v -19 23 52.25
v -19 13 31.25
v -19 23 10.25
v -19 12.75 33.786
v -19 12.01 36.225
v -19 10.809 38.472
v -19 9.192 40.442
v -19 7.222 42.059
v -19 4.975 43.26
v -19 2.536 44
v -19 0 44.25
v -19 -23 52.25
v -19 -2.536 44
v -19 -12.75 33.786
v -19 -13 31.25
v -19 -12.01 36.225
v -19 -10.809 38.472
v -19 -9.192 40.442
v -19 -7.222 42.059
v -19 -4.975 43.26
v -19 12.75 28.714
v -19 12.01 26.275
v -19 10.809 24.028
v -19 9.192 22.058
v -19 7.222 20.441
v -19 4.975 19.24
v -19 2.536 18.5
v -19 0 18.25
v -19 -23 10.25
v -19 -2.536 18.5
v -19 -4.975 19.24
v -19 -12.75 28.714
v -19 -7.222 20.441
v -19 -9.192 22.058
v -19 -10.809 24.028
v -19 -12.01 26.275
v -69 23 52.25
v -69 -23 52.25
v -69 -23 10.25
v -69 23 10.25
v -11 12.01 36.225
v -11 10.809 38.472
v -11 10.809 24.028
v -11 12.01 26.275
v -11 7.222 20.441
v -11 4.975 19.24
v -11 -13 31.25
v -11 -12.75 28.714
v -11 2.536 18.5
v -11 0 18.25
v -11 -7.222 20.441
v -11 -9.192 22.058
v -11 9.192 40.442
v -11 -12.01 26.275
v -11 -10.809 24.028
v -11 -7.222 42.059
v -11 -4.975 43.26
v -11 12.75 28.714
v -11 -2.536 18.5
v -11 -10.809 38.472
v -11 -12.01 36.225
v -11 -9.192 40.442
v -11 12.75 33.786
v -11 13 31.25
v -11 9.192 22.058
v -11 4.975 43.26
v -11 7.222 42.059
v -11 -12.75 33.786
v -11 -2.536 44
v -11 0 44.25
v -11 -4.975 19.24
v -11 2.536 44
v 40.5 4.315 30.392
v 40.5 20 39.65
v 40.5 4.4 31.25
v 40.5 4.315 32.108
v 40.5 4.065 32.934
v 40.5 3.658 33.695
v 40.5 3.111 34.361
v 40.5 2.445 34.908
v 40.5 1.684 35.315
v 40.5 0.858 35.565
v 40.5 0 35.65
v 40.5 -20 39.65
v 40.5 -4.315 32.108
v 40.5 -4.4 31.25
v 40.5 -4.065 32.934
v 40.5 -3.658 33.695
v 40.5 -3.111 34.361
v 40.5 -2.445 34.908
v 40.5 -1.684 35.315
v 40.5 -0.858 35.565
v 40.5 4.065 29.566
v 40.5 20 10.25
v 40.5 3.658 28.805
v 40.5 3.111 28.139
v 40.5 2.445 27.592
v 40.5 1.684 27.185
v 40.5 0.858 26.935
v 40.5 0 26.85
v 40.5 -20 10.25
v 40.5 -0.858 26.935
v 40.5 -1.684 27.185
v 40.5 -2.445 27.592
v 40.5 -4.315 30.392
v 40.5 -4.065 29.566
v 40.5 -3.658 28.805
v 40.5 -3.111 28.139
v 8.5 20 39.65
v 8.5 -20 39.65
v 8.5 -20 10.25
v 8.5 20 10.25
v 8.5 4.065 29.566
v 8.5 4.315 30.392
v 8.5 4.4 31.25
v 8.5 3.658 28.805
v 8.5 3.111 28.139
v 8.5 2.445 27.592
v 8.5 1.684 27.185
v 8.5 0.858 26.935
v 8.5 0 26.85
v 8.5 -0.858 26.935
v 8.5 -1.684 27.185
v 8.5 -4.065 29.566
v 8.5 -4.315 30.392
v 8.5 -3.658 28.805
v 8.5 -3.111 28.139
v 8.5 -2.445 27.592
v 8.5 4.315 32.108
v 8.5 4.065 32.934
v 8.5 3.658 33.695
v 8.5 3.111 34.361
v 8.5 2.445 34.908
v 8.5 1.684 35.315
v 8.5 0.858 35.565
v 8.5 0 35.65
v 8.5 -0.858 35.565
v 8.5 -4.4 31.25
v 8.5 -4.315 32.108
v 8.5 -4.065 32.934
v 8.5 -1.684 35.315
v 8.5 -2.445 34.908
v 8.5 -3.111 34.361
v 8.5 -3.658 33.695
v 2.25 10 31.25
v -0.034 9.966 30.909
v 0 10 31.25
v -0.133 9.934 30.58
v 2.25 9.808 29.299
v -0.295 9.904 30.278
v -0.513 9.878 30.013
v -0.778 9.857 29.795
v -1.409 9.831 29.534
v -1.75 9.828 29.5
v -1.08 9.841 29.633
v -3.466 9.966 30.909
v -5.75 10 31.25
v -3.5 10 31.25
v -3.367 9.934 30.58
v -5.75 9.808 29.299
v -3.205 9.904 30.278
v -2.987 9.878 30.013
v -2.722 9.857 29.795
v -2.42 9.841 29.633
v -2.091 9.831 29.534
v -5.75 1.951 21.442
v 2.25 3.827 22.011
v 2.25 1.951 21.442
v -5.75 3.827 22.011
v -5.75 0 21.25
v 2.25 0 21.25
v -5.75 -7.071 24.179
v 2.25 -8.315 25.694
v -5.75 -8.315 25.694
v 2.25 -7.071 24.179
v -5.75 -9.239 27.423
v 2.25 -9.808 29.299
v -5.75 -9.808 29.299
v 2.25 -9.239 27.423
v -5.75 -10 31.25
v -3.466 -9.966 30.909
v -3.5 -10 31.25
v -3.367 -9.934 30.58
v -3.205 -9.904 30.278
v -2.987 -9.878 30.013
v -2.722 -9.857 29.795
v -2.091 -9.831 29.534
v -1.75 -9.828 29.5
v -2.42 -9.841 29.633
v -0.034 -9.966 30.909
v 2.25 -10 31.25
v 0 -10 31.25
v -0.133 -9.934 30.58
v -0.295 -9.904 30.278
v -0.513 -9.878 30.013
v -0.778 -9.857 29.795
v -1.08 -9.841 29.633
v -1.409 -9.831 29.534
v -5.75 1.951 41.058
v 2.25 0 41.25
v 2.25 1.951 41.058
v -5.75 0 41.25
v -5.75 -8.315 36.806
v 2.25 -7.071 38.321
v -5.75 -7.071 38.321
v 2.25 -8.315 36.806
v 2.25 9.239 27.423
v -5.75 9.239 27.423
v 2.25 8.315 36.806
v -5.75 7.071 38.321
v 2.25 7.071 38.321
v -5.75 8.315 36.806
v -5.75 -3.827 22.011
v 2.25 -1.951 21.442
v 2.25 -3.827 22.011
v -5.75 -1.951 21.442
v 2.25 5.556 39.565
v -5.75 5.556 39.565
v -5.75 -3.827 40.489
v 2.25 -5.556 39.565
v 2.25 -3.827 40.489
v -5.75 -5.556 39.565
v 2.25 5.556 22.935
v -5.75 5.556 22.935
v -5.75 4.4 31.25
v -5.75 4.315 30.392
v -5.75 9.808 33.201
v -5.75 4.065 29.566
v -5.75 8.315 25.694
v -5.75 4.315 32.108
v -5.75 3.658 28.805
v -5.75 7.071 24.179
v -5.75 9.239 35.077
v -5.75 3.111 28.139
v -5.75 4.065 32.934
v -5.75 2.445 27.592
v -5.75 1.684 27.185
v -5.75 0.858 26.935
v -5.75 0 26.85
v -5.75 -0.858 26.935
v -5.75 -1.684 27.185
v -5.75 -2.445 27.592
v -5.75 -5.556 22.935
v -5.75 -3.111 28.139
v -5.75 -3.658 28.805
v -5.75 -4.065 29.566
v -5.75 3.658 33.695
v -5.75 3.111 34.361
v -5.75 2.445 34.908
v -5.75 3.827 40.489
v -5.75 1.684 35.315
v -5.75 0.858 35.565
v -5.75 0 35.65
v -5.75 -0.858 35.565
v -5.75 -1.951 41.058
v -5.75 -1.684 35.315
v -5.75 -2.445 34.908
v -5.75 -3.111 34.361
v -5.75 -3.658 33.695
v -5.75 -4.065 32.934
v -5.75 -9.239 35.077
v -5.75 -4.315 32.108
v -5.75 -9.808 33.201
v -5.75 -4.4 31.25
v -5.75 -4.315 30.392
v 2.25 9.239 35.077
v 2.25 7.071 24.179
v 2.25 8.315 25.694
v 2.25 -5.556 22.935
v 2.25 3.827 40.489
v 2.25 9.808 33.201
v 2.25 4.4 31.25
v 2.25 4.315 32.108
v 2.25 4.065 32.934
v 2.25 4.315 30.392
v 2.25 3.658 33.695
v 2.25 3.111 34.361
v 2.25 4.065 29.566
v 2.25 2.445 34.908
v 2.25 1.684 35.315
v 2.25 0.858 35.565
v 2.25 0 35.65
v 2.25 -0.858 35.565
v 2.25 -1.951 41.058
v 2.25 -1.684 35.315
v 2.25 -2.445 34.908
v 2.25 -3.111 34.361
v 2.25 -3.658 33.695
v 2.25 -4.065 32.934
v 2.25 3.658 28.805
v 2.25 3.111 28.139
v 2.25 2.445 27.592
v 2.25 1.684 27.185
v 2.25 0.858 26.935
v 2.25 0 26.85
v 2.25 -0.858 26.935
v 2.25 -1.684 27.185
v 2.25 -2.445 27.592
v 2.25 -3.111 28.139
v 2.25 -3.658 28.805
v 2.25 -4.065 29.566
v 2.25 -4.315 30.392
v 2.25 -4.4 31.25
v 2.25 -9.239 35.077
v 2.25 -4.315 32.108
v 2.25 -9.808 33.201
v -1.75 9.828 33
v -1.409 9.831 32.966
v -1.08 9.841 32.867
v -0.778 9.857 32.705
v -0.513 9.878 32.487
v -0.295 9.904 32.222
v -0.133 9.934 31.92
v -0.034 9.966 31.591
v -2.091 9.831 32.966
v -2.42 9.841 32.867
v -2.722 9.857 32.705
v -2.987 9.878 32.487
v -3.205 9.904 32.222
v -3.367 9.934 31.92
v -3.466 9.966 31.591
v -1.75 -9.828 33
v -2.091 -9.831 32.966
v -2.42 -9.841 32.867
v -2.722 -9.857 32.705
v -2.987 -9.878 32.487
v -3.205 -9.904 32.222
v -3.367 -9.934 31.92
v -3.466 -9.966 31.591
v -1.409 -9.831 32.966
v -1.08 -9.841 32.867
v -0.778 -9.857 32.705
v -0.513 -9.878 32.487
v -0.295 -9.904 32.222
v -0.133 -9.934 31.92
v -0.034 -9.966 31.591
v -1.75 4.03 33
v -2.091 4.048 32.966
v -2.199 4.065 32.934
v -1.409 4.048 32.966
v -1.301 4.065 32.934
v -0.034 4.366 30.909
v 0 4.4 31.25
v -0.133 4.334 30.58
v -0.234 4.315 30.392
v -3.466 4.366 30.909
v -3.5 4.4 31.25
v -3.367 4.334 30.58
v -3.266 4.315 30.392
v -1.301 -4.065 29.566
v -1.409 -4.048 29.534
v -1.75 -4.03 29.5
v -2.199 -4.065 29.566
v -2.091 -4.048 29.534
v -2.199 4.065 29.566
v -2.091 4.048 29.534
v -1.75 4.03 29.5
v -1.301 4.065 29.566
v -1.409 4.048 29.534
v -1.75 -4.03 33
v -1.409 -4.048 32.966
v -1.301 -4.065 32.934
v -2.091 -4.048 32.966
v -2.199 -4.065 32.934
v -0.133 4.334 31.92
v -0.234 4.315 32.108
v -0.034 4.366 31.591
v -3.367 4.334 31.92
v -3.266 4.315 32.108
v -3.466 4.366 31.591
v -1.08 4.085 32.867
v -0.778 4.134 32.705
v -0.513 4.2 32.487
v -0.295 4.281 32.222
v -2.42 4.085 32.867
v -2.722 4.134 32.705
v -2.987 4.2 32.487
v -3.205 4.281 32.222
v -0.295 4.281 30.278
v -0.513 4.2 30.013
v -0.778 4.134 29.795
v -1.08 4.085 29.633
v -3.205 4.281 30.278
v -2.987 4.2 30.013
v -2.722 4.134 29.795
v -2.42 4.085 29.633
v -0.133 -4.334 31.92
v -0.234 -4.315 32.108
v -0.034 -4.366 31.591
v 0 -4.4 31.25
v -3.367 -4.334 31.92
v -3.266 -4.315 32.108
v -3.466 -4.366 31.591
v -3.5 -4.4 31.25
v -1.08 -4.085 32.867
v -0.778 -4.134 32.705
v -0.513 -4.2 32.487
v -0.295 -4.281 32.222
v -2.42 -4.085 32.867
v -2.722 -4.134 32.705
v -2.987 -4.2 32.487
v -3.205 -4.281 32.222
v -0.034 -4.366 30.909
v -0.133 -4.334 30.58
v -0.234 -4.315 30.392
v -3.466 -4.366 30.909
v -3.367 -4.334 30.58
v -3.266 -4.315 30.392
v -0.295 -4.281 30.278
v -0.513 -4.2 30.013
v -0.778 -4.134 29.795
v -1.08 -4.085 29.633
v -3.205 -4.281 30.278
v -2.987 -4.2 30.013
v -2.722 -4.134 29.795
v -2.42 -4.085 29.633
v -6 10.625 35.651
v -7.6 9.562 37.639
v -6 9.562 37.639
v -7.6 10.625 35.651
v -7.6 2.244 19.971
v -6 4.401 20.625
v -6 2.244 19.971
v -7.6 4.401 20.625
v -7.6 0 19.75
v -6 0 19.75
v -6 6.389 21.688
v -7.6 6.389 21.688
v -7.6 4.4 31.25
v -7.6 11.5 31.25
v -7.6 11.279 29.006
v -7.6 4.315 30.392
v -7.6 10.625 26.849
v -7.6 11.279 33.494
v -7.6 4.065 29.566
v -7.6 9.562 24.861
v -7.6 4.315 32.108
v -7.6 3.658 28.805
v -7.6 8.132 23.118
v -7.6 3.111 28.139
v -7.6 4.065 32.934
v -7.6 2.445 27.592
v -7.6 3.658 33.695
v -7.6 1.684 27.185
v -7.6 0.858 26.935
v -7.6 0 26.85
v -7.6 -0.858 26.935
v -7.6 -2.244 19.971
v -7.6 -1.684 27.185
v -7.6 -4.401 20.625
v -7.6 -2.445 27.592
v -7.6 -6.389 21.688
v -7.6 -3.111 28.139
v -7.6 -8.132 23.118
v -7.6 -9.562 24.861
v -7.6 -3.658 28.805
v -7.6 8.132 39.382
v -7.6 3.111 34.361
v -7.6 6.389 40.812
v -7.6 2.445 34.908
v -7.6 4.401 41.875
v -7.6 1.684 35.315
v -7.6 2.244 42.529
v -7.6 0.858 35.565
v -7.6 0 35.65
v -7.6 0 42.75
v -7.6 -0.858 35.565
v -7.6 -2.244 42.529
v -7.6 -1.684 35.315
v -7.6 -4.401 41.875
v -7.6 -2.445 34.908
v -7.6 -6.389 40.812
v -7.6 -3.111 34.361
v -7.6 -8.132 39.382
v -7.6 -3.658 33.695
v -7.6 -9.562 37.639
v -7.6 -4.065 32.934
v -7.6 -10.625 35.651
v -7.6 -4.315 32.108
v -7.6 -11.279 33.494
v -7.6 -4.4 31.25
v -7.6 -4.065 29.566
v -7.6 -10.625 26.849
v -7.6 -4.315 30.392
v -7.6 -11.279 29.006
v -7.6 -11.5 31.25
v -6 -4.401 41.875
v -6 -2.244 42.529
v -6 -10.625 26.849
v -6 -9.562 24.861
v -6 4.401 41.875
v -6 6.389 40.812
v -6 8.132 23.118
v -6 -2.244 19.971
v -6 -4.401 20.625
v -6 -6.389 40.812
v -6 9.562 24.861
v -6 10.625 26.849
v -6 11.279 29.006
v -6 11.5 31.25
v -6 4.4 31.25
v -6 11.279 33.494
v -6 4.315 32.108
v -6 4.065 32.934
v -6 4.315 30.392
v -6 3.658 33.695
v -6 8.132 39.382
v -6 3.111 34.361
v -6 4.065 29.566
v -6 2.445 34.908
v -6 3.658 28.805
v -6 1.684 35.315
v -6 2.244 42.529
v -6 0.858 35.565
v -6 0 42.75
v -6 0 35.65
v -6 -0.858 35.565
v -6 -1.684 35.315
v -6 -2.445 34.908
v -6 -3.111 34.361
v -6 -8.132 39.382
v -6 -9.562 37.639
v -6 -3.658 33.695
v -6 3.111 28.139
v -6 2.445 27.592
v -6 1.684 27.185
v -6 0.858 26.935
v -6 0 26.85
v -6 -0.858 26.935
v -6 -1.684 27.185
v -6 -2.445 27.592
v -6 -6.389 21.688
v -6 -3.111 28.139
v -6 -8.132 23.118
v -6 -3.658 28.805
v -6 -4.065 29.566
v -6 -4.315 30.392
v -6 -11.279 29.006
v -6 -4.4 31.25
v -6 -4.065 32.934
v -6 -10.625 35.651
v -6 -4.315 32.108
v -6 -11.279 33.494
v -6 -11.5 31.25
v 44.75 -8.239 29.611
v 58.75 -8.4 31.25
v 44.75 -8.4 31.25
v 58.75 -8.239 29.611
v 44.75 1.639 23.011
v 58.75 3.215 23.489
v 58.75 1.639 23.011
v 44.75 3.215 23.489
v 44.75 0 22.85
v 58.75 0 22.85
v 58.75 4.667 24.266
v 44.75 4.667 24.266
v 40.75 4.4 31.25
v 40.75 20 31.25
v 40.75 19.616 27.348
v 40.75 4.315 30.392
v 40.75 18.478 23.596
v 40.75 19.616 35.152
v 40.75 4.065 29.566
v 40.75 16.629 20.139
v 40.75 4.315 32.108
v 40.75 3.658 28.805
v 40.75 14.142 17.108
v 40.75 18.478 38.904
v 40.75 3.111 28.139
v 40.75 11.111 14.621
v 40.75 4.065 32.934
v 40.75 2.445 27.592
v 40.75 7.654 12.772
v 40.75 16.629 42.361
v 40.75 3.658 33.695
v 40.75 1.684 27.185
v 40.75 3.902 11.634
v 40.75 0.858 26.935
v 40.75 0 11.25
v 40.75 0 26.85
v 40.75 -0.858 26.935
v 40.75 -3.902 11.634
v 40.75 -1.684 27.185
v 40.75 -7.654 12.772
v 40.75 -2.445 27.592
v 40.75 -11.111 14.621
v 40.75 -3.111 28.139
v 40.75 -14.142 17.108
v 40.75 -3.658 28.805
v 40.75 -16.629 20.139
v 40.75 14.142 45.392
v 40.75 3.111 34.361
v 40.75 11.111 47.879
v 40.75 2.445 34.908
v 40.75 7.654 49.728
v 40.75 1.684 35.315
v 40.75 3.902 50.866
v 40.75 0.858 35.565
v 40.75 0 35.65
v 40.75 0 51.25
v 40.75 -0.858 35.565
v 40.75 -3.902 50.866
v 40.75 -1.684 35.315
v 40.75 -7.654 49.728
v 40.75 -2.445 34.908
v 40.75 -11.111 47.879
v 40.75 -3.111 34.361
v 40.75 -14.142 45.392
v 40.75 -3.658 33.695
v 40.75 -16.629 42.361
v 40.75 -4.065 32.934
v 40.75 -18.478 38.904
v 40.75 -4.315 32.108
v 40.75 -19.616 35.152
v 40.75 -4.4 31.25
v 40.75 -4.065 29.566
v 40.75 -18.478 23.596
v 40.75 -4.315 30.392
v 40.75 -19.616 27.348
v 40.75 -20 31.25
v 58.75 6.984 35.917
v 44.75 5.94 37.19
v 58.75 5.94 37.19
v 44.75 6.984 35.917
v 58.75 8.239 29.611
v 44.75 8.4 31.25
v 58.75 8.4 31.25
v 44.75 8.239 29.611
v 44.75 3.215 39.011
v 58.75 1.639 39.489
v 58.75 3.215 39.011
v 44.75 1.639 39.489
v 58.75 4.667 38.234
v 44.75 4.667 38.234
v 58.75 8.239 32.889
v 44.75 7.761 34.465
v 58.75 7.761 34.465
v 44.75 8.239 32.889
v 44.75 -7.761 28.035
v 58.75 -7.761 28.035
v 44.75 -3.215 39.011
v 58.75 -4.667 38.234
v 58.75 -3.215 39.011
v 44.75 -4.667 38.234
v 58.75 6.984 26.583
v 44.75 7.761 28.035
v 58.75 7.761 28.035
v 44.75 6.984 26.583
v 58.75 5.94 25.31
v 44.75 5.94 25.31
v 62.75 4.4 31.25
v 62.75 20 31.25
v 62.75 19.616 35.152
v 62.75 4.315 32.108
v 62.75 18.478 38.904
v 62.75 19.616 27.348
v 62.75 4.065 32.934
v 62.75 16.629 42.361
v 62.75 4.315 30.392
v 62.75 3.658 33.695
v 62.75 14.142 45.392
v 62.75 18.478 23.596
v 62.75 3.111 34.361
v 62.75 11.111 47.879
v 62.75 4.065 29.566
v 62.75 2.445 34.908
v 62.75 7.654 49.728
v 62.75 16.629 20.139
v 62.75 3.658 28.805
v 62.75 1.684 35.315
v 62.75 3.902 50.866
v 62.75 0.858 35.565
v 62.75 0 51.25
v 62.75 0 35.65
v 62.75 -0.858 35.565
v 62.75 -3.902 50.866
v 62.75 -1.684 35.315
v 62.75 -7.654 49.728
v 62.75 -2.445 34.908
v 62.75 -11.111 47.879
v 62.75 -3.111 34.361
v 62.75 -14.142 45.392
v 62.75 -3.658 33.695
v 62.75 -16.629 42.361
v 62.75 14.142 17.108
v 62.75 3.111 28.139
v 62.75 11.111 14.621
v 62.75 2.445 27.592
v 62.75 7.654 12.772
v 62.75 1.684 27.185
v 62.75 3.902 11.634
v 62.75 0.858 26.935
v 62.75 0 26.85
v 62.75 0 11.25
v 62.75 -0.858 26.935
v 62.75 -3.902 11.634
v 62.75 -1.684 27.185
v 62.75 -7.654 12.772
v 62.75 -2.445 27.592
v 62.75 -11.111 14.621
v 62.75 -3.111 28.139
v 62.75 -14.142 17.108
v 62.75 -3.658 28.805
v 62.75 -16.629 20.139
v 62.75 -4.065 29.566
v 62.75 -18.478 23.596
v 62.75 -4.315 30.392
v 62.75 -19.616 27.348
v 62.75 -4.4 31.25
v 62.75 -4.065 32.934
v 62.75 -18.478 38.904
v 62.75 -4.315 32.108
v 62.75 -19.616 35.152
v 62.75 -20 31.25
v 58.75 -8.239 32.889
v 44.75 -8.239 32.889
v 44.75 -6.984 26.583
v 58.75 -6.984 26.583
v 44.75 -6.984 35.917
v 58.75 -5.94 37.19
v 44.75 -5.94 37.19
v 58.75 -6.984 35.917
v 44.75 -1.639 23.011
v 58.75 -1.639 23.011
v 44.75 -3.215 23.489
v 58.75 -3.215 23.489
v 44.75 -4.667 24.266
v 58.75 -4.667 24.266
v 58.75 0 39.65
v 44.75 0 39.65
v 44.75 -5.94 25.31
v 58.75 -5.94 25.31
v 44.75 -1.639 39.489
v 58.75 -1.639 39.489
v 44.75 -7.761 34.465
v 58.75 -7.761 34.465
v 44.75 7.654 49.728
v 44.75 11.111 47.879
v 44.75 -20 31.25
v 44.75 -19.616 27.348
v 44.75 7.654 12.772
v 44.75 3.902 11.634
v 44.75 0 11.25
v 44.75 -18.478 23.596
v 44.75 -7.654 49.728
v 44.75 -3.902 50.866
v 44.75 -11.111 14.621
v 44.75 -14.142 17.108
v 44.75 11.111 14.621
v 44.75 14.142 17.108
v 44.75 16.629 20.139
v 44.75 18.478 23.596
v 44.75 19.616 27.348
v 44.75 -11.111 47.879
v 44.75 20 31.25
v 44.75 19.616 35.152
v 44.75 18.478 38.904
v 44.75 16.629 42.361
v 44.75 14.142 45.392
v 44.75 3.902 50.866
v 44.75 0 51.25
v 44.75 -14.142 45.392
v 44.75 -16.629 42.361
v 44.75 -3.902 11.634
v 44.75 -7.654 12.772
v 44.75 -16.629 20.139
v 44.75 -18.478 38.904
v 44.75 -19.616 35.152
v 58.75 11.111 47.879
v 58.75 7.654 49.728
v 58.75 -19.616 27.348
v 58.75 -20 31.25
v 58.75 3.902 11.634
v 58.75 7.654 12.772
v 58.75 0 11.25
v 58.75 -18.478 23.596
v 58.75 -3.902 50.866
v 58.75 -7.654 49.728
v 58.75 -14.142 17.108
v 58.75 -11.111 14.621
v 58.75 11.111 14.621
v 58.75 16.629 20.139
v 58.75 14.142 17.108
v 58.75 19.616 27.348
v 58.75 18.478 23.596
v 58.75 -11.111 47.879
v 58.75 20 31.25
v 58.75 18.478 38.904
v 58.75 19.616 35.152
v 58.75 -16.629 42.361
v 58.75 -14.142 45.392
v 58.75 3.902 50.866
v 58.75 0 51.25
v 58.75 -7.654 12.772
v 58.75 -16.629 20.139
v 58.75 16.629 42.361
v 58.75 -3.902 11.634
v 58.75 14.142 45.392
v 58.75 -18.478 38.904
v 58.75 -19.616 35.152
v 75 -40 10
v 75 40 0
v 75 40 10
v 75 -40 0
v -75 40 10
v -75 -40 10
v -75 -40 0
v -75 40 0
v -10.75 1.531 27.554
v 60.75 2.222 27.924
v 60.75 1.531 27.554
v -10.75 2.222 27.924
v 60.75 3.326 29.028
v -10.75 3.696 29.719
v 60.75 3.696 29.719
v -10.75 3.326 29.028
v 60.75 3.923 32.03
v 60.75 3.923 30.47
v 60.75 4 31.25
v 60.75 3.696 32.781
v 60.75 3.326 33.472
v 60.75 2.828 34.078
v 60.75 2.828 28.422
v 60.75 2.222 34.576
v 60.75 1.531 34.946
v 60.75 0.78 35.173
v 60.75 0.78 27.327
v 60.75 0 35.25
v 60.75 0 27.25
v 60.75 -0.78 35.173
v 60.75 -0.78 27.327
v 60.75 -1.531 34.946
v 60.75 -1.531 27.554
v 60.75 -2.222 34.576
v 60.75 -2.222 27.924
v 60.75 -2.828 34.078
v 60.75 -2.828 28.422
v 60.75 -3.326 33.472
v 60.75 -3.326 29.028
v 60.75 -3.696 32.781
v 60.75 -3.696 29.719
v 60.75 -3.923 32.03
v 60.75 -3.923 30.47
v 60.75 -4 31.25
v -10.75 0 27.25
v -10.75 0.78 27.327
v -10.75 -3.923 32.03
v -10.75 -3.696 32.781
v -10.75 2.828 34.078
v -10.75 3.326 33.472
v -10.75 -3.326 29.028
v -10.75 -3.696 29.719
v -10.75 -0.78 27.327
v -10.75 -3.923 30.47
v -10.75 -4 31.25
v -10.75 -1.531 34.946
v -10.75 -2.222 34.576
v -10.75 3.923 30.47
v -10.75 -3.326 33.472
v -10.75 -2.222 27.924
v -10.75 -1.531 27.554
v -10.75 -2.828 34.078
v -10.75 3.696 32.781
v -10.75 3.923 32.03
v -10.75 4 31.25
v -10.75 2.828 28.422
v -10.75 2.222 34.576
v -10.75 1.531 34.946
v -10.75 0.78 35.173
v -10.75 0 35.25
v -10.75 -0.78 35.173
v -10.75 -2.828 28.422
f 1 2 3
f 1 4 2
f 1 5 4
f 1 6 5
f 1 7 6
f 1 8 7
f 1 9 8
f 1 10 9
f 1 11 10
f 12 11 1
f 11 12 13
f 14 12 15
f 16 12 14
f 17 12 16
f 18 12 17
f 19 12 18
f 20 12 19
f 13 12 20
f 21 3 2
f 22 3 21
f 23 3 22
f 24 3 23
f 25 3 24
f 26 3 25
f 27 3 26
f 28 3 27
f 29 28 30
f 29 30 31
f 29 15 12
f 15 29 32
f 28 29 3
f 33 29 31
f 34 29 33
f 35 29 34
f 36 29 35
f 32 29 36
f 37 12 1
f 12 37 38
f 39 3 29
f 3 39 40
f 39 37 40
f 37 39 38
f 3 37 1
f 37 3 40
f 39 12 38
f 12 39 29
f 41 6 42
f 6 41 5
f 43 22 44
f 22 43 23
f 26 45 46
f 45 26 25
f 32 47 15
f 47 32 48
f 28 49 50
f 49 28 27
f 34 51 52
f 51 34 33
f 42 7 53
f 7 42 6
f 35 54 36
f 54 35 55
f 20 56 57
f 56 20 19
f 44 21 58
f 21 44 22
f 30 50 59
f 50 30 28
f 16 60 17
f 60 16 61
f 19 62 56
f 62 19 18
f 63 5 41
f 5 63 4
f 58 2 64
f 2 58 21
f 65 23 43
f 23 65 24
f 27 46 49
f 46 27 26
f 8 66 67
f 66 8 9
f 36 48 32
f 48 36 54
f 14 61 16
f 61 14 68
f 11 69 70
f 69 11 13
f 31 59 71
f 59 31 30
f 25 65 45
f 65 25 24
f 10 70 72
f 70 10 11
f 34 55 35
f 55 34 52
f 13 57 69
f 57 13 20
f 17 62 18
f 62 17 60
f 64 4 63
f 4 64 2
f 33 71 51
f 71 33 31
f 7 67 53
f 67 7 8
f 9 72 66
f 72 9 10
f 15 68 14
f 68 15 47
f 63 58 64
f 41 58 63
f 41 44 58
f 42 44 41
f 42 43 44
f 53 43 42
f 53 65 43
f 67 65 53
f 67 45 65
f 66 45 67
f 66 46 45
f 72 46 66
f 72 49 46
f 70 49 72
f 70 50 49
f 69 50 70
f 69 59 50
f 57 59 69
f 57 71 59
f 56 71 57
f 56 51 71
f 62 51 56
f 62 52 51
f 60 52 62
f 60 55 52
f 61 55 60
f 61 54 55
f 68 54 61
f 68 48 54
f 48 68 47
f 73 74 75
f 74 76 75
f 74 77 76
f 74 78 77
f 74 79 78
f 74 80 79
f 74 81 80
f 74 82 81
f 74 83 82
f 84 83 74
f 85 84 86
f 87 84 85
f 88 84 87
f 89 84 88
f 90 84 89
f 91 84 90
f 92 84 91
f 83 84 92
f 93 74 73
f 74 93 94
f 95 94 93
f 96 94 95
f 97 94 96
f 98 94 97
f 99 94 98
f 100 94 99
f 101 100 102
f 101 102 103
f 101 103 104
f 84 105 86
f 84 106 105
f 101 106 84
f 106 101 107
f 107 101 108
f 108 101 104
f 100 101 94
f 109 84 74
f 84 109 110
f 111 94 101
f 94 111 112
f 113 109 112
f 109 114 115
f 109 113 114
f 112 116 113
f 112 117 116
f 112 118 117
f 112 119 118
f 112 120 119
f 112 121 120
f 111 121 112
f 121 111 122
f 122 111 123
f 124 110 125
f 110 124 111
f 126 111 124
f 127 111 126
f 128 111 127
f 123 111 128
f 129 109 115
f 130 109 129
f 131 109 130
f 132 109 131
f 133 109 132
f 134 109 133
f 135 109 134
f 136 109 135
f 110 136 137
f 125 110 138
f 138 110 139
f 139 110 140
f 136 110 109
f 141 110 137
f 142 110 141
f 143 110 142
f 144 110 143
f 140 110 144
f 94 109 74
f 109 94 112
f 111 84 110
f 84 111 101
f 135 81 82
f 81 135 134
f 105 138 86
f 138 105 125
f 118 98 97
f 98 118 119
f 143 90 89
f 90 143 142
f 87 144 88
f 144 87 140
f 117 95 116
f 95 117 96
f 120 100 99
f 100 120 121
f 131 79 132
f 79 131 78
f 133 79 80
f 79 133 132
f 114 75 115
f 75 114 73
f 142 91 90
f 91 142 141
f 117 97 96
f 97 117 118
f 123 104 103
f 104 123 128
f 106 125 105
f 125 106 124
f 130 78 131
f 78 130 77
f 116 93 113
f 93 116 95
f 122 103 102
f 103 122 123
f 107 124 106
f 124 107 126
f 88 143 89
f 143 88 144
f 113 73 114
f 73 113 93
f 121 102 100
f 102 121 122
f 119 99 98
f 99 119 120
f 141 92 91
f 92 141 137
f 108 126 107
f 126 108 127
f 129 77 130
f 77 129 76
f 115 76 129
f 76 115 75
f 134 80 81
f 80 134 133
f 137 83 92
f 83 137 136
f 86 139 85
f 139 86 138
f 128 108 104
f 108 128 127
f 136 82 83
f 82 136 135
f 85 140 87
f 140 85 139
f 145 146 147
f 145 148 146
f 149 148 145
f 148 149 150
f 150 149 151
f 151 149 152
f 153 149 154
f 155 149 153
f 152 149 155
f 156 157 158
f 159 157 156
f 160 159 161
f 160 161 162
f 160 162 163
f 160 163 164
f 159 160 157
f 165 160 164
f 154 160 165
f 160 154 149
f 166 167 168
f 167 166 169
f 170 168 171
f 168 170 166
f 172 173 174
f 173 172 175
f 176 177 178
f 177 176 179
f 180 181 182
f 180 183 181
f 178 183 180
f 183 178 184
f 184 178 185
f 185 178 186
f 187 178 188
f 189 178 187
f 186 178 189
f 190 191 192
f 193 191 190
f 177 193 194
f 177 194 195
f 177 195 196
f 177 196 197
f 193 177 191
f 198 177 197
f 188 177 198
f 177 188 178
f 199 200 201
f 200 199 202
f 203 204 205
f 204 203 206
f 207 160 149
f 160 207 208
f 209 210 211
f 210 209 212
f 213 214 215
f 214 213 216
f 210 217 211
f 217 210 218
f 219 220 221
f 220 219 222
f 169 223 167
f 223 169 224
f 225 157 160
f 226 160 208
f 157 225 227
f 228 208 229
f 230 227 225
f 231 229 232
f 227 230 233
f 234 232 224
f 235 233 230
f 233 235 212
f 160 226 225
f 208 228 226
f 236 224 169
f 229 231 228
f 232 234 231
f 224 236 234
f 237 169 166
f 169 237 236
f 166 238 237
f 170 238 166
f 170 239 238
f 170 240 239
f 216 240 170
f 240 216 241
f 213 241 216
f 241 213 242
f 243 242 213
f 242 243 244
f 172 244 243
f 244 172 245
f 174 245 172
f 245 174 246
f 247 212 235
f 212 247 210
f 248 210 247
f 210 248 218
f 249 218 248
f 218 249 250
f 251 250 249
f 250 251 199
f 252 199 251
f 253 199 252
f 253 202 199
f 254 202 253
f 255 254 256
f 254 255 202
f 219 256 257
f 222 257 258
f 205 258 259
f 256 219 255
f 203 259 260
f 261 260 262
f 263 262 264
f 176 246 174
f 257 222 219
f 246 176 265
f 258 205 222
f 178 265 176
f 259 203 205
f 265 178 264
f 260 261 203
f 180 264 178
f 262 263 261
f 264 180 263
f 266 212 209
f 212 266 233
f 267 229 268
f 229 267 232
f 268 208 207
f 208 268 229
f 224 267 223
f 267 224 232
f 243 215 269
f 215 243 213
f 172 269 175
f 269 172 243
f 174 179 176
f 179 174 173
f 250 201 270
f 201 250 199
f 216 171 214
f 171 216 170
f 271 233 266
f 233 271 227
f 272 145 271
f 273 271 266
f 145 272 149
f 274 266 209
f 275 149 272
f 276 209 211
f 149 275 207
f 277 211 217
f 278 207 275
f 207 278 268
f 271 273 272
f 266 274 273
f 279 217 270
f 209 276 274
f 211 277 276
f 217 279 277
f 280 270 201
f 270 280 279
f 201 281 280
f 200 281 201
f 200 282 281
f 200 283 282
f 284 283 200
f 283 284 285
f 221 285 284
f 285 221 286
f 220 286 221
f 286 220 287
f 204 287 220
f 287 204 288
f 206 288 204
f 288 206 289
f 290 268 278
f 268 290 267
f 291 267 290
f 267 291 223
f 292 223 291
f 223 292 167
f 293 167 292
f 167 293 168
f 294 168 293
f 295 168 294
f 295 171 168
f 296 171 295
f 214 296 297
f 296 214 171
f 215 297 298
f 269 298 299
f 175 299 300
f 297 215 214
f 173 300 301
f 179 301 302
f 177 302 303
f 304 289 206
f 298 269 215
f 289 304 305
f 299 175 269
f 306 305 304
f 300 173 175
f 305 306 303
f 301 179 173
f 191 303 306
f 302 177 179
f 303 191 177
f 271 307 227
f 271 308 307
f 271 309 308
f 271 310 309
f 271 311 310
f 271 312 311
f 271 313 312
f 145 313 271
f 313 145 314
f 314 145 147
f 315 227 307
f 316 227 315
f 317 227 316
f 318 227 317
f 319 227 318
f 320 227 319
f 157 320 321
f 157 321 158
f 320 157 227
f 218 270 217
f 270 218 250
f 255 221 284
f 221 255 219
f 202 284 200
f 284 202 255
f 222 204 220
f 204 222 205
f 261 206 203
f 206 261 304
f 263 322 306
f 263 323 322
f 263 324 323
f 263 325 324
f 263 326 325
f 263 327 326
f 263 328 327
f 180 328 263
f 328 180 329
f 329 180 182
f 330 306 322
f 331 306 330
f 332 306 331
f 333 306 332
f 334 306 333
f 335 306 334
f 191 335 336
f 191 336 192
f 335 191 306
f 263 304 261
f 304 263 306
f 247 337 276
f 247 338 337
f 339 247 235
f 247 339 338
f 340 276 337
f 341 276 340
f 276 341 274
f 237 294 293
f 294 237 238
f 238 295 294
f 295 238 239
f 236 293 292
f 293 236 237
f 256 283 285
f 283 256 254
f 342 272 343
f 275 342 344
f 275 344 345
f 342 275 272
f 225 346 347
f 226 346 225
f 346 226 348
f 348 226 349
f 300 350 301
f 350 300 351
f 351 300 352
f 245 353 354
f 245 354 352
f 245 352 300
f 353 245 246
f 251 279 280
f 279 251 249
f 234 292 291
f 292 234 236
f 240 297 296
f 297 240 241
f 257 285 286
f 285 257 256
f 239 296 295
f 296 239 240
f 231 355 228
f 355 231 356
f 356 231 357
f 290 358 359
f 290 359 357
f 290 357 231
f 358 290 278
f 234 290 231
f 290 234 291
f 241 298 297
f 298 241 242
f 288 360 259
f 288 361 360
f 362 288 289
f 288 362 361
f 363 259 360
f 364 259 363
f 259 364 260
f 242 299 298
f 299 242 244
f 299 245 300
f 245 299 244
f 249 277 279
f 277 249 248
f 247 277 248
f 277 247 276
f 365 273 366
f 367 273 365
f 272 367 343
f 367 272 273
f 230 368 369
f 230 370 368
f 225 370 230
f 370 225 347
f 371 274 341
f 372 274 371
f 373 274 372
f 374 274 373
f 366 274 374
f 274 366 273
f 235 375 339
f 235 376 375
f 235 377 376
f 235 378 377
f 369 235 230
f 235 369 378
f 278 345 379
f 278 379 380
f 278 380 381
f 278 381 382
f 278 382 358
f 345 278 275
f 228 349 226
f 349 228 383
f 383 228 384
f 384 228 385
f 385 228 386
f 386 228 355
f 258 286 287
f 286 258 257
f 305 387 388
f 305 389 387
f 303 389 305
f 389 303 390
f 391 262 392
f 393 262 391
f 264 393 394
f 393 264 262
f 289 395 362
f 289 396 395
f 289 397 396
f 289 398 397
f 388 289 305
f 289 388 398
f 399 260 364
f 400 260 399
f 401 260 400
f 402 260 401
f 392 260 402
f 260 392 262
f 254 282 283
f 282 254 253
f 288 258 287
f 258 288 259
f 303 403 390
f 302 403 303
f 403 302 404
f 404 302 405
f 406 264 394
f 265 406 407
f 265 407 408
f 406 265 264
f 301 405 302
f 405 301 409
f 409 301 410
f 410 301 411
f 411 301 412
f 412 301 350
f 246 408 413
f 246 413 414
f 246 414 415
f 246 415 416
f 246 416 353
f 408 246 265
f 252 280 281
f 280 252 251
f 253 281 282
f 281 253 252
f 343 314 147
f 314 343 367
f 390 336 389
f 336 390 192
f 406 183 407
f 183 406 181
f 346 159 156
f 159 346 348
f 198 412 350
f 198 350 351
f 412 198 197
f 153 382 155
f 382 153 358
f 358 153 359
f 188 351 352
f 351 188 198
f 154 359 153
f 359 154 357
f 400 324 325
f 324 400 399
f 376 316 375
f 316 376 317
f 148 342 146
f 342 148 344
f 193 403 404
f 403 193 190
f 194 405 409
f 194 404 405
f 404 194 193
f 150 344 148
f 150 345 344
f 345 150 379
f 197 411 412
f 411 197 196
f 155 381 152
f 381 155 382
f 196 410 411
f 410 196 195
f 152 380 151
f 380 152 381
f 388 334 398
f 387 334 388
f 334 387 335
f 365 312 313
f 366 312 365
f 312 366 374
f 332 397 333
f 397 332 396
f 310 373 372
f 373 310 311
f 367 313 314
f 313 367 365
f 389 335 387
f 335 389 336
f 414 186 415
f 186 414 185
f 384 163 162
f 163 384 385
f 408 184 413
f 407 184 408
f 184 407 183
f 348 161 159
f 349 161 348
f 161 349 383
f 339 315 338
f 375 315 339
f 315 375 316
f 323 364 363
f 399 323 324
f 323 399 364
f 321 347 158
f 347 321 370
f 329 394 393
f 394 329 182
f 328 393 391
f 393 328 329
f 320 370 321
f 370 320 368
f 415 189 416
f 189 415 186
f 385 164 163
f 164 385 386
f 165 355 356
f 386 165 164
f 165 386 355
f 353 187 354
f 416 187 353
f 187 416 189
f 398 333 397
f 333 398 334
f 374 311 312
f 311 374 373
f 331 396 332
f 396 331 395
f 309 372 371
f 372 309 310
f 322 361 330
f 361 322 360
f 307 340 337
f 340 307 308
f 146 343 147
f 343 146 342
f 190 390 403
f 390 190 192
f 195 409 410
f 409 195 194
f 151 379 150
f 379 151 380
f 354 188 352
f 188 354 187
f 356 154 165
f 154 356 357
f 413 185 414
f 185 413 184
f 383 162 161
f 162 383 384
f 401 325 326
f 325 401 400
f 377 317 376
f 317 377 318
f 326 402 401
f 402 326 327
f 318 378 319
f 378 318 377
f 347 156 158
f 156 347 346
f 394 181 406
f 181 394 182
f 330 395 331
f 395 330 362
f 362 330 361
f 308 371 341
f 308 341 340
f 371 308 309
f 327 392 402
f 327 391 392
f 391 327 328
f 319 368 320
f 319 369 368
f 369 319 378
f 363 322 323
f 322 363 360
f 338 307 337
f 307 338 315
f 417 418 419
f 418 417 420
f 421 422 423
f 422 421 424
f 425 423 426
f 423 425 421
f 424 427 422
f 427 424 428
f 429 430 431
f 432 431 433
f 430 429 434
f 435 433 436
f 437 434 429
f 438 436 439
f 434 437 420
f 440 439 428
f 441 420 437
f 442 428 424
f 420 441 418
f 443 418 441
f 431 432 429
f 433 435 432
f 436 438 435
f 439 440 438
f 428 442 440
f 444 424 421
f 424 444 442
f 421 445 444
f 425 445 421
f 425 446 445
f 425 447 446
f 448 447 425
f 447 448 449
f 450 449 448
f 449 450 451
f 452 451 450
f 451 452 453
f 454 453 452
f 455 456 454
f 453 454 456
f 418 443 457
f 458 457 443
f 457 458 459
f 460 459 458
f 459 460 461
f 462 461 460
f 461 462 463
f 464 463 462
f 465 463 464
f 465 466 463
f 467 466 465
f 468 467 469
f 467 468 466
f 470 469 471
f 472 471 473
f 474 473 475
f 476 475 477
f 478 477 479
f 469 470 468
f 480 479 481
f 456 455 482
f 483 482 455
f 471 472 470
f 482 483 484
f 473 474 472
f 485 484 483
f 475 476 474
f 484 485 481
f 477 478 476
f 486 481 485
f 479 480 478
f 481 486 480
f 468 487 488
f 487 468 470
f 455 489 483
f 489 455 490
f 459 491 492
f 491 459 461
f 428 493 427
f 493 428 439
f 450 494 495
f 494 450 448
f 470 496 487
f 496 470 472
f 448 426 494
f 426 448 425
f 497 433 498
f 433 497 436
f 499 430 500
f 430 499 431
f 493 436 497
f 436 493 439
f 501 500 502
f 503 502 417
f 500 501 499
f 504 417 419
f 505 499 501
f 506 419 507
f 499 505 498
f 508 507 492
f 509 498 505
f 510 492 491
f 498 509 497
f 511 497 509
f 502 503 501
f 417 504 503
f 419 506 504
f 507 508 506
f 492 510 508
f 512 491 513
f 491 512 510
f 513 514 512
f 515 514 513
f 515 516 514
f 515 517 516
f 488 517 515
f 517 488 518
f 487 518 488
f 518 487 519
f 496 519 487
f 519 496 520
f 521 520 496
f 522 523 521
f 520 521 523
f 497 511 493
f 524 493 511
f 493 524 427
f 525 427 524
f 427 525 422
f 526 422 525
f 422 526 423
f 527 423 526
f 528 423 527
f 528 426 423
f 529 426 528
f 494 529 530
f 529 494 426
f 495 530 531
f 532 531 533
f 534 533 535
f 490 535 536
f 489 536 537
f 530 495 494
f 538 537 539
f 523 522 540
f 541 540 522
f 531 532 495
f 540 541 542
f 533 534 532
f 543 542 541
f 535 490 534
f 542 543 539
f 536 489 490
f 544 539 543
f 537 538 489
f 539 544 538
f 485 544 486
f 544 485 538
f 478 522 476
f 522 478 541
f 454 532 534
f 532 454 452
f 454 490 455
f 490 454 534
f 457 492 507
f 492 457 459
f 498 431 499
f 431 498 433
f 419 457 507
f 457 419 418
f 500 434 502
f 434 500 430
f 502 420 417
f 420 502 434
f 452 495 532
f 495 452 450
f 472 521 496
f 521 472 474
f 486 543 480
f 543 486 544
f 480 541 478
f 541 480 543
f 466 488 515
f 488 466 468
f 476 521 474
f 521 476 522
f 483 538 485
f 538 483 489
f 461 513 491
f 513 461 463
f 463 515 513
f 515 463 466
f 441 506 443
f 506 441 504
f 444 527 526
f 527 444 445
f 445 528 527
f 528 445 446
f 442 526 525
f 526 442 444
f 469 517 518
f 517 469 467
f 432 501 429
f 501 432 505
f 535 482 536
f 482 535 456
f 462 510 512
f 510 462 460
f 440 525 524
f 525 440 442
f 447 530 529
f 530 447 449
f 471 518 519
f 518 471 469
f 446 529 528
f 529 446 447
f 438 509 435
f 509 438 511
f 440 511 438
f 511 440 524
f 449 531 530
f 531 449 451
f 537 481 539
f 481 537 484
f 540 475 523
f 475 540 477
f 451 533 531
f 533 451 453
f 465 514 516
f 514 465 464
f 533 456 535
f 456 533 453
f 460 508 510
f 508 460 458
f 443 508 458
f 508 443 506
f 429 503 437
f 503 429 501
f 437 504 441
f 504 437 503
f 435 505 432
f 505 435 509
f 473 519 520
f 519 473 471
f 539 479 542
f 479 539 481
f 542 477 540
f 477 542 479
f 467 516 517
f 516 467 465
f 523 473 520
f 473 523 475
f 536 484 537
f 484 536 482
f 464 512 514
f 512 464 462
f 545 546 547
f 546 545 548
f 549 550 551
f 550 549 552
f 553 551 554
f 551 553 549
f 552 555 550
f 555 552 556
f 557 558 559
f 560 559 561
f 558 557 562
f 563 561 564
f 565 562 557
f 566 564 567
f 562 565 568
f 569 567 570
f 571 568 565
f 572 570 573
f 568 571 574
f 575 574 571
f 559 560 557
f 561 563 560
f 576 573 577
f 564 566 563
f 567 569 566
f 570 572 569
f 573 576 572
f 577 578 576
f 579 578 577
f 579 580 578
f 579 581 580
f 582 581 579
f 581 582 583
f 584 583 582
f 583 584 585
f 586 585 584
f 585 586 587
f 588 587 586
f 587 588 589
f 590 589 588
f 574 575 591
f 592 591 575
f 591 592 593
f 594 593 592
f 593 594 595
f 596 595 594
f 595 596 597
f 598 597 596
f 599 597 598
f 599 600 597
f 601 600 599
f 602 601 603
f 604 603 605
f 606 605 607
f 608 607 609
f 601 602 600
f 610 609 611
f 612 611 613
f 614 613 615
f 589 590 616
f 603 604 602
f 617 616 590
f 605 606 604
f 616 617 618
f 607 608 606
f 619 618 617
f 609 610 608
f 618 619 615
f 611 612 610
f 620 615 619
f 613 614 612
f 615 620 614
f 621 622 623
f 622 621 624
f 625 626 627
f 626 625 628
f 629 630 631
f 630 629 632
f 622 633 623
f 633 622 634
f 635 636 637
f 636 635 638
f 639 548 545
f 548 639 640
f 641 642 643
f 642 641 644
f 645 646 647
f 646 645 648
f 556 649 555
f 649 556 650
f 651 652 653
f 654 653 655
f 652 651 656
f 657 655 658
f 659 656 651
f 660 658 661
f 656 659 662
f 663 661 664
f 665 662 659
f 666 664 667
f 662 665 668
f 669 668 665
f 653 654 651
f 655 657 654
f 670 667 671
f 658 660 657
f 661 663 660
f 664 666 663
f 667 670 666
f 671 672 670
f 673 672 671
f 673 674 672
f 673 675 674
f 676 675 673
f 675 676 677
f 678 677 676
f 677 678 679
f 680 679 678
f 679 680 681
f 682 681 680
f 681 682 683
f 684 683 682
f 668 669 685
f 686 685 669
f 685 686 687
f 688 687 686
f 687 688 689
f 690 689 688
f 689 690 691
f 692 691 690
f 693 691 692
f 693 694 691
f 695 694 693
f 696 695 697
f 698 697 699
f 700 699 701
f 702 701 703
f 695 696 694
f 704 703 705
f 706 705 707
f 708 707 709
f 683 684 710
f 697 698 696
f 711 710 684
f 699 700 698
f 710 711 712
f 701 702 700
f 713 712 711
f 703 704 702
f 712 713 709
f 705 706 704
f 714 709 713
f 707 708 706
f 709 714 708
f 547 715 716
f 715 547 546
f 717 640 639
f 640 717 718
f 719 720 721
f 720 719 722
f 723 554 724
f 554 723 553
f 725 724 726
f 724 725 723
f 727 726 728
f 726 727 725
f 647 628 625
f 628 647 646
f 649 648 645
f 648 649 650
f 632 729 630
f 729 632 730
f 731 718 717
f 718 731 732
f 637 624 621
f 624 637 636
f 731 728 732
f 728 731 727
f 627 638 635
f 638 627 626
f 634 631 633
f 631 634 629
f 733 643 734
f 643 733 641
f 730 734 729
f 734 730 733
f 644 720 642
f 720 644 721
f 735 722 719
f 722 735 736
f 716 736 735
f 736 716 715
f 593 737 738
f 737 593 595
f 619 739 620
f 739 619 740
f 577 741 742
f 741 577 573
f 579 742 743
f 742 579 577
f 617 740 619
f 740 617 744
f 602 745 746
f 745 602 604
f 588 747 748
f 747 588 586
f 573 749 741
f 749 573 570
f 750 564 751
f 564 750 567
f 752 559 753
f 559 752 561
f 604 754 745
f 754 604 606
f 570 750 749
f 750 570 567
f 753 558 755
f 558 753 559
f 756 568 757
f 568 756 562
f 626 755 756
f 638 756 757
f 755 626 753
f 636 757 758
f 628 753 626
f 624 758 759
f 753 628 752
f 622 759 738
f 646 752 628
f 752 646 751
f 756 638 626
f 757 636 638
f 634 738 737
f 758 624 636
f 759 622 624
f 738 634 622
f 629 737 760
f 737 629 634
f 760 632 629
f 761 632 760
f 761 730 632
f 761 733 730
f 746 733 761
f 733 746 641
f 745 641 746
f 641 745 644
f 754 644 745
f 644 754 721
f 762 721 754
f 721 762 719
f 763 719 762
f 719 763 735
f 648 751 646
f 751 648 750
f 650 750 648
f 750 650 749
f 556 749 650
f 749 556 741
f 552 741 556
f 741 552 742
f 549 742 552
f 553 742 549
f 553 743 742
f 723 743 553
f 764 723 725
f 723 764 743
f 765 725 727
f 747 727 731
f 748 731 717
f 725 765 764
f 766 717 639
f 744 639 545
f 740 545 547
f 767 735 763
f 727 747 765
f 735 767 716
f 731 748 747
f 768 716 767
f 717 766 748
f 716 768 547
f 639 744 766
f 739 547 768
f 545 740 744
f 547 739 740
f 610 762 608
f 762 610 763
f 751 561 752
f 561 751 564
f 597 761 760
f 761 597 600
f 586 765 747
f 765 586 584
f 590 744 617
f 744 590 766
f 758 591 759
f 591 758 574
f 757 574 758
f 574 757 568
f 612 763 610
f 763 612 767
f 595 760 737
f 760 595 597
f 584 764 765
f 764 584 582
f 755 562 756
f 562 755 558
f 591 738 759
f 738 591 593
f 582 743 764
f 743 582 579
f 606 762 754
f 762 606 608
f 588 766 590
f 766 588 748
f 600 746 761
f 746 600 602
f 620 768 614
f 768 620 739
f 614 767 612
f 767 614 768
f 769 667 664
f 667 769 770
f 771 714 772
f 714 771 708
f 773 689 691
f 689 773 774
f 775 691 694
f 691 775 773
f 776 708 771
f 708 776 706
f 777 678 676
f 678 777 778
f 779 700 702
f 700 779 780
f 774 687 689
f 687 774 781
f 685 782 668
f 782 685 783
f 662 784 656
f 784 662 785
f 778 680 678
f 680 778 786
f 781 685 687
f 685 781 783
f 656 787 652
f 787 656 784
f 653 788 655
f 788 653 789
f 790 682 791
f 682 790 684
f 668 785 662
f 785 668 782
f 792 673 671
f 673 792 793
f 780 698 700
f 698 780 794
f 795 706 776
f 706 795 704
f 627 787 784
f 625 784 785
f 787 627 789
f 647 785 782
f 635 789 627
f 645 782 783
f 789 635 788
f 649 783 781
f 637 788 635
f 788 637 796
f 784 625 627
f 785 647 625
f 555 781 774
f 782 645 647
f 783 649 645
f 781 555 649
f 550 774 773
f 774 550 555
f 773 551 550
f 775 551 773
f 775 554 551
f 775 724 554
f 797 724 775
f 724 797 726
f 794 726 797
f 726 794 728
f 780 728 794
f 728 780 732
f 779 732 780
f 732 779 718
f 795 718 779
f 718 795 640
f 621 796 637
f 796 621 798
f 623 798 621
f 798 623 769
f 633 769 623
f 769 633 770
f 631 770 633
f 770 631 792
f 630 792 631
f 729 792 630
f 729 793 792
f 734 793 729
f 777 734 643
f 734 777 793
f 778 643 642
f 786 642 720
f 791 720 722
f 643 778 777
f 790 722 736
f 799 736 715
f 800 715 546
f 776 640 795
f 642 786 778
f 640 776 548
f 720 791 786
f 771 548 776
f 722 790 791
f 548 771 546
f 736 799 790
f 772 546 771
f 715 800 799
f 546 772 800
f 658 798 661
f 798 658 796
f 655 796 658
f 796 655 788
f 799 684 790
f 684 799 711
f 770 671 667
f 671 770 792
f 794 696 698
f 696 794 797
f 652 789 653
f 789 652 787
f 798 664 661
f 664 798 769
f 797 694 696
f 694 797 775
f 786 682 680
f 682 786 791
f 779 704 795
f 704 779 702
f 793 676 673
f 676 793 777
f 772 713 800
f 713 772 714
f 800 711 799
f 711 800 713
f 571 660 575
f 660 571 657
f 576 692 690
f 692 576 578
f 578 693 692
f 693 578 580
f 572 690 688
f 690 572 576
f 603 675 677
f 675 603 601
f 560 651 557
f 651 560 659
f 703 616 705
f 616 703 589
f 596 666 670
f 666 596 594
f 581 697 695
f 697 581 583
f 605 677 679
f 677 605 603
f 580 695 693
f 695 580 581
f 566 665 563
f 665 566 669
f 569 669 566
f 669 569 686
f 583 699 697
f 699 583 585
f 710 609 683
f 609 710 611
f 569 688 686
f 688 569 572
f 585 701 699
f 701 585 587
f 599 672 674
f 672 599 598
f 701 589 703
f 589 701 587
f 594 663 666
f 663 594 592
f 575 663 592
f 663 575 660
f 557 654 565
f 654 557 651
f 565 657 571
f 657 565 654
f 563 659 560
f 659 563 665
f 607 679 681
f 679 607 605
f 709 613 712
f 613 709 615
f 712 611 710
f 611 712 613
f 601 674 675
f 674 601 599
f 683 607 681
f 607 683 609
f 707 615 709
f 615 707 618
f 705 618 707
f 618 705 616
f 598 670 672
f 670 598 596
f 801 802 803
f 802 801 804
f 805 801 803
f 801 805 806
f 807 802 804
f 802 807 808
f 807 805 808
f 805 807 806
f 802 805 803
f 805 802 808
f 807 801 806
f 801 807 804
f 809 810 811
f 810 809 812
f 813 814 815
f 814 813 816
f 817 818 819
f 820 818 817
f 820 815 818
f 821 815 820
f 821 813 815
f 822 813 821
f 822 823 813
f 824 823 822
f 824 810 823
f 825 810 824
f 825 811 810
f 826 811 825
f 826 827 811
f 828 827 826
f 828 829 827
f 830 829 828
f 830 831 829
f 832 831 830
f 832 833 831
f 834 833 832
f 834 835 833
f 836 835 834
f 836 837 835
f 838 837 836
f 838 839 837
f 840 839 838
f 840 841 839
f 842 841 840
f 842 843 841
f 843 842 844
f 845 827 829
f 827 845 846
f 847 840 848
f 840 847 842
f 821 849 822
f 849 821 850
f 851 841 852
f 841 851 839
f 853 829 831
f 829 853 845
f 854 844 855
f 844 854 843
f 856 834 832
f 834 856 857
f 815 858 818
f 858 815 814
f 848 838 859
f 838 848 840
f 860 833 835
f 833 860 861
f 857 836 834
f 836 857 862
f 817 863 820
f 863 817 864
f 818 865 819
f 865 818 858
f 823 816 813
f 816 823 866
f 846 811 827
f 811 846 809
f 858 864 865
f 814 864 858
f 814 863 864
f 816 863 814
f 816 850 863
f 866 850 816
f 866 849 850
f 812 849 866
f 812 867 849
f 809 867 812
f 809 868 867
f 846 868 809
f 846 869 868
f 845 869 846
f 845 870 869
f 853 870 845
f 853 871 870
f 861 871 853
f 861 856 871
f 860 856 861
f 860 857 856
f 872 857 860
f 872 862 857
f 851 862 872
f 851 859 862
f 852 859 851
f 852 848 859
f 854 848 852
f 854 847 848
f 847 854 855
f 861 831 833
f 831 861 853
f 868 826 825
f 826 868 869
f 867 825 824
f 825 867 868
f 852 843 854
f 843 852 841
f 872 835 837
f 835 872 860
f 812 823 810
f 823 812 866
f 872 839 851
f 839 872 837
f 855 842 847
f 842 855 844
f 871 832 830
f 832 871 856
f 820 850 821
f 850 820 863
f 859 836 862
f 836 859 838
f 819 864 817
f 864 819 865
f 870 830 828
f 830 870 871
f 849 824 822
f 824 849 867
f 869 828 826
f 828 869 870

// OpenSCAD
$fn = 32;

// ------------------------------------------------------------------------
// Motor drive station: motor 50 x 42 mm, shaft d8, pulley d40
// Every part is its own module, assembly() places every instance.
// ------------------------------------------------------------------------

// --- part 1 ---
module station_bed() {
  difference() {
    translate([-75, -40, 0]) cube([150, 80, 10]);
  }
}

// --- part 2 ---
module drive_motor() {
  union() {
    translate([-25, -23, 0]) cube([50, 46, 42]);
    translate([29, 0, 21]) rotate([0, 90, 0]) cylinder(h = 8, d = 26, center = true);
  }
}

// --- part 3 ---
module pillow_block() {
  difference() {
    translate([-16, -20, 0]) cube([32, 40, 29.4]);
    translate([0, 0, 21]) rotate([0, 90, 0]) cylinder(h = 34, d = 8.8, center = true);
  }
}

// --- part 4 ---
module drive_shaft() {
  translate([0, 0, -35.75]) cylinder(h = 71.5, d = 8);
}

// --- part 5 ---
module shaft_collar() {
  difference() {
    cylinder(h = 8, d = 20);
    translate([0, 0, -1]) cylinder(h = 10, d = 8.8);
    translate([0, 0, 4]) rotate([90, 0, 0]) cylinder(h = 22, d = 3.5, center = true);
  }
}

// --- part 6 ---
module collar_washer() {
  difference() {
      translate([0, 0, 0]) cylinder(h = 1.6, d = 23);
      translate([0, 0, -1]) cylinder(h = 3.6, d = 8.8);
    }
}

// --- part 7 ---
module drive_pulley() {
  difference() {
    union() {
      cylinder(h = 22, d = 16.8);
      cylinder(h = 4, d = 40);
      translate([0, 0, 18]) cylinder(h = 4, d = 40);
    }
    translate([0, 0, -1]) cylinder(h = 24, d = 8.8);
  }
}

// --- assembly ---
module assembly() {
  color([0.80, 0.24, 0.20]) translate([0, 0, 0]) rotate([0, 0, 0]) station_bed();
  color([0.20, 0.45, 0.75]) translate([-44, 0, 10.25]) rotate([0, 0, 0]) drive_motor();
  color([0.25, 0.62, 0.32]) translate([24.5, 0, 10.25]) rotate([0, 0, 0]) pillow_block();
  color([0.92, 0.70, 0.18]) translate([25, 0, 31.25]) rotate([0, 90, 0]) drive_shaft();
  color([0.58, 0.35, 0.70]) translate([-5.75, 0, 31.25]) rotate([0, 90, 0]) shaft_collar();
  color([0.16, 0.66, 0.66]) translate([-7.6, 0, 31.25]) rotate([0, 90, 0]) collar_washer();
  color([0.85, 0.48, 0.18]) translate([40.75, 0, 31.25]) rotate([0, 90, 0]) drive_pulley();
}

assembly();
